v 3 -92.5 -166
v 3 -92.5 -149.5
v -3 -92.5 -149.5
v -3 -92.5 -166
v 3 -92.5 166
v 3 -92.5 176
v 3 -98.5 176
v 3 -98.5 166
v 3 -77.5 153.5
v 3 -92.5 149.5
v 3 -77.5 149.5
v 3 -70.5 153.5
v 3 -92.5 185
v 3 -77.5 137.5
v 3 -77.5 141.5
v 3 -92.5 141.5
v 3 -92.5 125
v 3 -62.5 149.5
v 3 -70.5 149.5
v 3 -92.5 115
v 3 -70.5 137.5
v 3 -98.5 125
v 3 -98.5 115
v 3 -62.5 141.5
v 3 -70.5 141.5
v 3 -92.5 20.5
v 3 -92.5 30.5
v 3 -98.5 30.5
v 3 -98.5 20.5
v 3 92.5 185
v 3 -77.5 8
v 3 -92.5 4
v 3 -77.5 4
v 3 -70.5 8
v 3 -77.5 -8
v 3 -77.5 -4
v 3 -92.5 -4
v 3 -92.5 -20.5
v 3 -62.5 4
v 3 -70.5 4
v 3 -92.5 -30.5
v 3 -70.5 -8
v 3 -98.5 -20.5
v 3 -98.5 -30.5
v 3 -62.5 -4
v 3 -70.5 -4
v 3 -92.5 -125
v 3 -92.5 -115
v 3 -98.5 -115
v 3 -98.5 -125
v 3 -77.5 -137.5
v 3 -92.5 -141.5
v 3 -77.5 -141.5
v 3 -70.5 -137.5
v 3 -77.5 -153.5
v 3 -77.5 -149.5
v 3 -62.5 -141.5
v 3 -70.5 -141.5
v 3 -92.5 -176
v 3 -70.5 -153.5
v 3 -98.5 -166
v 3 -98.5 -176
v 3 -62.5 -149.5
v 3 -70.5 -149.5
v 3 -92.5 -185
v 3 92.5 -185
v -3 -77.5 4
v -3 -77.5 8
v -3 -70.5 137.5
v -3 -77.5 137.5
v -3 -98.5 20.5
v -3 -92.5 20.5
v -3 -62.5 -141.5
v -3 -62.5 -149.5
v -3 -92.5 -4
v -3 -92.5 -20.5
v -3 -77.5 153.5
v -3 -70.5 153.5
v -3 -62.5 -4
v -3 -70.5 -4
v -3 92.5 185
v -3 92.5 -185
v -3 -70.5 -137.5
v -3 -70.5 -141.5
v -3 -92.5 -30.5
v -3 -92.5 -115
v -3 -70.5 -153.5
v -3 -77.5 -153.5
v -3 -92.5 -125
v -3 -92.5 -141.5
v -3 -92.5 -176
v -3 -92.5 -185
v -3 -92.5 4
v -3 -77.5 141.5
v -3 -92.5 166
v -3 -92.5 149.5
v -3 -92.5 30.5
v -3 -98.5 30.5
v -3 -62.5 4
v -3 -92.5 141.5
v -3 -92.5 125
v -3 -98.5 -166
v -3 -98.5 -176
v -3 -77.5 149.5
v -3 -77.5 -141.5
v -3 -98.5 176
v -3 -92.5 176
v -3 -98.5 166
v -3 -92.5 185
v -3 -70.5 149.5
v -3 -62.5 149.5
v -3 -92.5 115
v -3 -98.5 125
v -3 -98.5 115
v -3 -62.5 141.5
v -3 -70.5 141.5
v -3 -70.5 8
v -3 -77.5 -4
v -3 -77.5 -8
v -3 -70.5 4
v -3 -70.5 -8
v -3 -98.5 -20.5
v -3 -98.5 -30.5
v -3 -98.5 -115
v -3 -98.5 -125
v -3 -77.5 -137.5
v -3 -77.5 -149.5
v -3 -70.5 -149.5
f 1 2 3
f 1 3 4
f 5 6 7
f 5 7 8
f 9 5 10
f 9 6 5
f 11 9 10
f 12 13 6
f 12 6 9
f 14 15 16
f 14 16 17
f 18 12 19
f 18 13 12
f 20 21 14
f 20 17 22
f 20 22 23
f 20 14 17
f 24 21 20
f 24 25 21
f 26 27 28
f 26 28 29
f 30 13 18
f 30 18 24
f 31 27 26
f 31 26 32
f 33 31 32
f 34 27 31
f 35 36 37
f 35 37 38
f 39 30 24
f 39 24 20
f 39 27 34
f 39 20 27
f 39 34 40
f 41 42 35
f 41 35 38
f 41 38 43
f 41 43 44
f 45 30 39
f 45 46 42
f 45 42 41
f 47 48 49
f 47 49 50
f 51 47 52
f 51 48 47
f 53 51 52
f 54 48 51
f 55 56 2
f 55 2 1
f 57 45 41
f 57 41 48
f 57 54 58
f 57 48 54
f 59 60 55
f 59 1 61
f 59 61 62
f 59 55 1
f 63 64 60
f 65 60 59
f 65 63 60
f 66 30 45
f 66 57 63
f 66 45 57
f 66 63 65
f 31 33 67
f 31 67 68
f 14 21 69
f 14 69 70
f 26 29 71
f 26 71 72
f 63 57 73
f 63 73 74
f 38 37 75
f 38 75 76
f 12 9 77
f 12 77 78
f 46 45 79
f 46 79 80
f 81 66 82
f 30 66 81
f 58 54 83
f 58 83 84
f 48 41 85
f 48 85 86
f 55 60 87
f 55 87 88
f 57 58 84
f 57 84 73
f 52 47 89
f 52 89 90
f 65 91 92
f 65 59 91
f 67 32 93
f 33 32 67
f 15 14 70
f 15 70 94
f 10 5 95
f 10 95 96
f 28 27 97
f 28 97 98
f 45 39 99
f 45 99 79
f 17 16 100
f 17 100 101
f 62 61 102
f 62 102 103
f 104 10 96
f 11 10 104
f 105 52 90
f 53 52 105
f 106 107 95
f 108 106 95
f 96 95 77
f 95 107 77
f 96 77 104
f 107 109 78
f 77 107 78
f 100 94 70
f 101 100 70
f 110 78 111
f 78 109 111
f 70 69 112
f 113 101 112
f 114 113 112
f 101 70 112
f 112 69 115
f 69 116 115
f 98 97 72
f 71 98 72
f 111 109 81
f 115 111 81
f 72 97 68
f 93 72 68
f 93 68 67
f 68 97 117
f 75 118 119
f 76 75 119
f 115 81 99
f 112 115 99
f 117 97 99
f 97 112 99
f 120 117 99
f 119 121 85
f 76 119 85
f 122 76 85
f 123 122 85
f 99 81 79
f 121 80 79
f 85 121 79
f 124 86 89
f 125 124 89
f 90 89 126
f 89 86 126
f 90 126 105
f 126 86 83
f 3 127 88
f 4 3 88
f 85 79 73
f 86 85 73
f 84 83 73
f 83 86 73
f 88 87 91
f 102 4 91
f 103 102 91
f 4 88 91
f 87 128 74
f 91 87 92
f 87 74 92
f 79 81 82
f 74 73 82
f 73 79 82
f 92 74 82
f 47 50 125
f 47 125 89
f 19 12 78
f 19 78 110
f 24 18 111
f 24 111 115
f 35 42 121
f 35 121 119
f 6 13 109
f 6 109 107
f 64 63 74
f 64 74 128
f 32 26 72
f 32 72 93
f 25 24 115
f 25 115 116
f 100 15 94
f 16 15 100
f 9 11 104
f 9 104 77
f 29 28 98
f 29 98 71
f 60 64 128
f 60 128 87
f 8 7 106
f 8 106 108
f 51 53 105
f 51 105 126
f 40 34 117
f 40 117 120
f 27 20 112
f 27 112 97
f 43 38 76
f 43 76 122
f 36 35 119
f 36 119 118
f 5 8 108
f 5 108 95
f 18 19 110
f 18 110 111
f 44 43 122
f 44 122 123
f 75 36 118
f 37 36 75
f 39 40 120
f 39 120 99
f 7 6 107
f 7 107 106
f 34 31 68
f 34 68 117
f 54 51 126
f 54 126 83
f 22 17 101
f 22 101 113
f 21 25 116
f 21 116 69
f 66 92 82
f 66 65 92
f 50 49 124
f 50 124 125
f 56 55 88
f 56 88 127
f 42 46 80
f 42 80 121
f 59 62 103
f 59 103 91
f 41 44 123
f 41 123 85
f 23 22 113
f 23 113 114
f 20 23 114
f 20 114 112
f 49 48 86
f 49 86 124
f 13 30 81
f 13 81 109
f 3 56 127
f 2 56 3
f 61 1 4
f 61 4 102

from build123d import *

# Parameters (mm, degrees)
BOSS_EXTRUDE1_DEPTH = 3


with BuildPart() as part:
    # Sketch1 → Boss-Extrude1 (new, symmetric)
    with BuildSketch(Plane(origin=(0, 0, 0), x_dir=(0, 0, -1), z_dir=(1, 0, 0))):
        Polygon((185, 92.5), (-185, 92.5), (-185, -92.5), (-176, -92.5), (-176, -98.5), (-166, -98.5), (-166, -92.5), (-149.5, -92.5), (-149.5, -77.5), (-153.5, -77.5), (-153.5, -70.5), (-149.5, -70.5), (-149.5, -62.5), (-141.5, -62.5), (-141.5, -70.5), (-137.5, -70.5), (-137.5, -77.5), (-141.5, -77.5), (-141.5, -92.5), (-125, -92.5), (-125, -98.5), (-115, -98.5), (-115, -92.5), (-30.5, -92.5), (-30.5, -98.5), (-20.5, -98.5), (-20.5, -92.5), (-4, -92.5), (-4, -77.5), (-8, -77.5), (-8, -70.5), (-4, -70.5), (-4, -62.5), (4, -62.5), (4, -70.5), (8, -70.5), (8, -77.5), (4, -77.5), (4, -92.5), (20.5, -92.5), (20.5, -98.5), (30.5, -98.5), (30.5, -92.5), (115, -92.5), (115, -98.5), (125, -98.5), (125, -92.5), (141.5, -92.5), (141.5, -77.5), (137.5, -77.5), (137.5, -70.5), (141.5, -70.5), (141.5, -62.5), (149.5, -62.5), (149.5, -70.5), (153.5, -70.5), (153.5, -77.5), (149.5, -77.5), (149.5, -92.5), (166, -92.5), (166, -98.5), (176, -98.5), (176, -92.5), (185, -92.5), align=None)
    extrude(amount=BOSS_EXTRUDE1_DEPTH, both=True)


solid = part.part
